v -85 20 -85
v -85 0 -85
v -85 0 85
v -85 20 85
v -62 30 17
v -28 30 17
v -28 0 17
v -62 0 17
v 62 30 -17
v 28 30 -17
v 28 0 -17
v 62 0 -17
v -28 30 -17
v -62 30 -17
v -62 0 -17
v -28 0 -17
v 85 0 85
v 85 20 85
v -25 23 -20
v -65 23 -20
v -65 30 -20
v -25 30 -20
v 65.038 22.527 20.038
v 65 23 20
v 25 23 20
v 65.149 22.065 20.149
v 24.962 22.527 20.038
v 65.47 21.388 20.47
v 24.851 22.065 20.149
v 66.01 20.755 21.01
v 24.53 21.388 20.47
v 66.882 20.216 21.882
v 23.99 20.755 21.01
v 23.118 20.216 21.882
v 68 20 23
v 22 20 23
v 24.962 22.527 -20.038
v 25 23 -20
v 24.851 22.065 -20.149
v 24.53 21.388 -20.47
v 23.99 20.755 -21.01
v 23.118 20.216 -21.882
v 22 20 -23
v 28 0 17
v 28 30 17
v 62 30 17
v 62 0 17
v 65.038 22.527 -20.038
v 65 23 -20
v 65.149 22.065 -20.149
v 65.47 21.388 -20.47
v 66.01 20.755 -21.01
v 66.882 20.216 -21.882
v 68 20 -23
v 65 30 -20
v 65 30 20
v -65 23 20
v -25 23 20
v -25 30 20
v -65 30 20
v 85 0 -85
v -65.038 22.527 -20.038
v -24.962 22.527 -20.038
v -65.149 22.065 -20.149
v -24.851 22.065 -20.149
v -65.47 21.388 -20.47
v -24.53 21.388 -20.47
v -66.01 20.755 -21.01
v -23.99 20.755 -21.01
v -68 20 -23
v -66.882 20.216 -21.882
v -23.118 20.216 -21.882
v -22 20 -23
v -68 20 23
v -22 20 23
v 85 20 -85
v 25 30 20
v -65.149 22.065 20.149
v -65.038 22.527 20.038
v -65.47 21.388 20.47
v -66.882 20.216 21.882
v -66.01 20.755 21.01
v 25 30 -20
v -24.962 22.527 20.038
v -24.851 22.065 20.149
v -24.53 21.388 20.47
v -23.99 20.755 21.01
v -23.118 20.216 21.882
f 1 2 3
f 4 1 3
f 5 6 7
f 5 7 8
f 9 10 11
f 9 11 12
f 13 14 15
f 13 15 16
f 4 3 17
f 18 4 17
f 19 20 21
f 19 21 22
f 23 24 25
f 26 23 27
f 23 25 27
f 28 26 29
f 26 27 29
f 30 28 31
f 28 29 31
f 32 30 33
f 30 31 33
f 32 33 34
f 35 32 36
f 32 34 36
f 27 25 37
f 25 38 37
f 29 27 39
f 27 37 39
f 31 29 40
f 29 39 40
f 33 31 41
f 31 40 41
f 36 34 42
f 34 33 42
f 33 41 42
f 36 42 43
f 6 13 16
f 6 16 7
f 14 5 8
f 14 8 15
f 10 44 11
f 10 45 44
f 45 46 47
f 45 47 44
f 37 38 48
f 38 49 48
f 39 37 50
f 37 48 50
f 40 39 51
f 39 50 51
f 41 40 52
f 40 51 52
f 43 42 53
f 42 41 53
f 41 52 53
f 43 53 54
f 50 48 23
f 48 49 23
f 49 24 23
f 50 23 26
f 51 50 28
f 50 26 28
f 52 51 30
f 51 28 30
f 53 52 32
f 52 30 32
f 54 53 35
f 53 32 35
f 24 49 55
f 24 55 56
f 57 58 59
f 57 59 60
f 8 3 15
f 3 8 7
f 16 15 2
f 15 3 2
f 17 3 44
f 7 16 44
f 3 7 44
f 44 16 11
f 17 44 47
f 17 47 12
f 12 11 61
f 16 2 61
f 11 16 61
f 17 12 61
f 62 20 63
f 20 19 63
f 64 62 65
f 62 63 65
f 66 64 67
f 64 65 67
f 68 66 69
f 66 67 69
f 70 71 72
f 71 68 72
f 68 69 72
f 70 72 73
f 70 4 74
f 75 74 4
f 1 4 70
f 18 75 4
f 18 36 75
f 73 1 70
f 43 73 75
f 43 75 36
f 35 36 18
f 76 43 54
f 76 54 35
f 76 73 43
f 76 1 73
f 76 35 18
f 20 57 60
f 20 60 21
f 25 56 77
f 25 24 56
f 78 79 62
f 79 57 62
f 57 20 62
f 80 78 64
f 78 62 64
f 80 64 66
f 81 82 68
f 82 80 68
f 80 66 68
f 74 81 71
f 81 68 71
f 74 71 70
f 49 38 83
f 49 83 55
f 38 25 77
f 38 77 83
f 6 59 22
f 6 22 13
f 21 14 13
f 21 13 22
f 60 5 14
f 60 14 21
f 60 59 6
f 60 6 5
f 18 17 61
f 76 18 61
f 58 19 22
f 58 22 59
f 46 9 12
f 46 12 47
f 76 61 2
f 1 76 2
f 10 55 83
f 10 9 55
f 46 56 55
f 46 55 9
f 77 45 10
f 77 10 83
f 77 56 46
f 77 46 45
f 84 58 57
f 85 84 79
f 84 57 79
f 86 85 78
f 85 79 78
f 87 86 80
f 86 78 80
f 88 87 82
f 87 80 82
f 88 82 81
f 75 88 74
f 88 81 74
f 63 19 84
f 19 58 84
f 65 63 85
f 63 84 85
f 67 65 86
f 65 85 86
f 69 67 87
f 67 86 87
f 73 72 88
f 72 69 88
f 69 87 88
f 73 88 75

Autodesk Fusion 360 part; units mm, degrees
sketch "Sketch1" plane through (0, 0, 0) normal (0, 1, 0) x (1, 0, 0)
  line L0 (0, -85) -> (85, -85)
  line L1 (85, -85) -> (85, 85)
  line L2 (85, 85) -> (-85, 85)
  line L3 (-85, 85) -> (-85, -85)
  line L4 (-85, -85) -> (0, -85)
  dimension "d4" = 170
  dimension "d5" = 170
extrude "Extrude1" add sketch "Sketch1" along normal blind 20
sketch "Sketch2" plane through (0, 20, 0) normal (0, 1, 0) x (-1, 0, 0)
  line L0 (85, 85) -> (-85, 85)
  line L1 (-85, 85) -> (-85, -85)
  line L2 (-85, -85) -> (85, -85)
  line L3 (85, -85) -> (85, 85)
  line L4 (65, 0) -> (65, -20)
  line L5 (65, -20) -> (25, -20)
  line L6 (25, -20) -> (25, 20)
  line L7 (25, 20) -> (65, 20)
  line L8 (65, 20) -> (65, 0)
  line L9 (-25, 0) -> (-25, -20)
  line L10 (-25, -20) -> (-65, -20)
  line L11 (-65, -20) -> (-65, 20)
  line L12 (-65, 20) -> (-25, 20)
  line L13 (-25, 20) -> (-25, 0)
  dimension "d13" = 40
  dimension "d14" = 40
  dimension "d17" = 40
  dimension "d18" = 40
extrude "Extrude2" add sketch "Sketch2" along normal blind 10 contours L4 L5 L6 L7 L8 | L9 L10 L11 L12 L13
sketch "Sketch3" plane through (0, 30, 0) normal (0, 1, 0) x (-1, 0, 0)
  line L0 (-25, 20) -> (-65, 20)
  line L1 (-65, 20) -> (-65, -20)
  line L2 (-65, -20) -> (-25, -20)
  line L3 (-25, -20) -> (-25, 20)
  line L4 (-28, 0) -> (-28, -17)
  line L5 (-28, -17) -> (-62, -17)
  line L6 (-62, -17) -> (-62, 17)
  line L7 (-62, 17) -> (-28, 17)
  line L8 (-28, 17) -> (-28, 0)
  dimension "d24" = 34
  dimension "d25" = 34
extrude "Extrude3" cut sketch "Sketch3" against normal blind 50 contours L4 L5 L6 L7 L8
sketch "Sketch4" plane through (0, 30, 0) normal (0, 1, 0) x (-1, 0, 0)
  line L0 (65, 20) -> (25, 20)
  line L1 (25, 20) -> (25, -20)
  line L2 (25, -20) -> (65, -20)
  line L3 (65, -20) -> (65, 20)
  line L4 (62, 0) -> (62, -17)
  line L5 (62, -17) -> (28, -17)
  line L6 (28, -17) -> (28, 17)
  line L7 (28, 17) -> (62, 17)
  line L8 (62, 17) -> (62, 0)
  dimension "d31" = 34
  dimension "d32" = 34
extrude "Extrude4" cut sketch "Sketch4" against normal blind 50 contours L4 L5 L6 L7 L8
fillet "Fillet1" radius 3 1 edges at (-45, 20, 20)
fillet "Fillet2" radius 3 1 edges at (-25, 20, 1.5)
fillet "Fillet3" radius 3 1 edges at (45, 20, 20)
fillet "Fillet4" radius 3 1 edges at (65, 20, 1.5)
fillet "Fillet5" radius 3 4 edges at (25, 20, 1.5) (46.5, 20, -20) (-43.5, 20, -20) (-65, 20, 1.5)
